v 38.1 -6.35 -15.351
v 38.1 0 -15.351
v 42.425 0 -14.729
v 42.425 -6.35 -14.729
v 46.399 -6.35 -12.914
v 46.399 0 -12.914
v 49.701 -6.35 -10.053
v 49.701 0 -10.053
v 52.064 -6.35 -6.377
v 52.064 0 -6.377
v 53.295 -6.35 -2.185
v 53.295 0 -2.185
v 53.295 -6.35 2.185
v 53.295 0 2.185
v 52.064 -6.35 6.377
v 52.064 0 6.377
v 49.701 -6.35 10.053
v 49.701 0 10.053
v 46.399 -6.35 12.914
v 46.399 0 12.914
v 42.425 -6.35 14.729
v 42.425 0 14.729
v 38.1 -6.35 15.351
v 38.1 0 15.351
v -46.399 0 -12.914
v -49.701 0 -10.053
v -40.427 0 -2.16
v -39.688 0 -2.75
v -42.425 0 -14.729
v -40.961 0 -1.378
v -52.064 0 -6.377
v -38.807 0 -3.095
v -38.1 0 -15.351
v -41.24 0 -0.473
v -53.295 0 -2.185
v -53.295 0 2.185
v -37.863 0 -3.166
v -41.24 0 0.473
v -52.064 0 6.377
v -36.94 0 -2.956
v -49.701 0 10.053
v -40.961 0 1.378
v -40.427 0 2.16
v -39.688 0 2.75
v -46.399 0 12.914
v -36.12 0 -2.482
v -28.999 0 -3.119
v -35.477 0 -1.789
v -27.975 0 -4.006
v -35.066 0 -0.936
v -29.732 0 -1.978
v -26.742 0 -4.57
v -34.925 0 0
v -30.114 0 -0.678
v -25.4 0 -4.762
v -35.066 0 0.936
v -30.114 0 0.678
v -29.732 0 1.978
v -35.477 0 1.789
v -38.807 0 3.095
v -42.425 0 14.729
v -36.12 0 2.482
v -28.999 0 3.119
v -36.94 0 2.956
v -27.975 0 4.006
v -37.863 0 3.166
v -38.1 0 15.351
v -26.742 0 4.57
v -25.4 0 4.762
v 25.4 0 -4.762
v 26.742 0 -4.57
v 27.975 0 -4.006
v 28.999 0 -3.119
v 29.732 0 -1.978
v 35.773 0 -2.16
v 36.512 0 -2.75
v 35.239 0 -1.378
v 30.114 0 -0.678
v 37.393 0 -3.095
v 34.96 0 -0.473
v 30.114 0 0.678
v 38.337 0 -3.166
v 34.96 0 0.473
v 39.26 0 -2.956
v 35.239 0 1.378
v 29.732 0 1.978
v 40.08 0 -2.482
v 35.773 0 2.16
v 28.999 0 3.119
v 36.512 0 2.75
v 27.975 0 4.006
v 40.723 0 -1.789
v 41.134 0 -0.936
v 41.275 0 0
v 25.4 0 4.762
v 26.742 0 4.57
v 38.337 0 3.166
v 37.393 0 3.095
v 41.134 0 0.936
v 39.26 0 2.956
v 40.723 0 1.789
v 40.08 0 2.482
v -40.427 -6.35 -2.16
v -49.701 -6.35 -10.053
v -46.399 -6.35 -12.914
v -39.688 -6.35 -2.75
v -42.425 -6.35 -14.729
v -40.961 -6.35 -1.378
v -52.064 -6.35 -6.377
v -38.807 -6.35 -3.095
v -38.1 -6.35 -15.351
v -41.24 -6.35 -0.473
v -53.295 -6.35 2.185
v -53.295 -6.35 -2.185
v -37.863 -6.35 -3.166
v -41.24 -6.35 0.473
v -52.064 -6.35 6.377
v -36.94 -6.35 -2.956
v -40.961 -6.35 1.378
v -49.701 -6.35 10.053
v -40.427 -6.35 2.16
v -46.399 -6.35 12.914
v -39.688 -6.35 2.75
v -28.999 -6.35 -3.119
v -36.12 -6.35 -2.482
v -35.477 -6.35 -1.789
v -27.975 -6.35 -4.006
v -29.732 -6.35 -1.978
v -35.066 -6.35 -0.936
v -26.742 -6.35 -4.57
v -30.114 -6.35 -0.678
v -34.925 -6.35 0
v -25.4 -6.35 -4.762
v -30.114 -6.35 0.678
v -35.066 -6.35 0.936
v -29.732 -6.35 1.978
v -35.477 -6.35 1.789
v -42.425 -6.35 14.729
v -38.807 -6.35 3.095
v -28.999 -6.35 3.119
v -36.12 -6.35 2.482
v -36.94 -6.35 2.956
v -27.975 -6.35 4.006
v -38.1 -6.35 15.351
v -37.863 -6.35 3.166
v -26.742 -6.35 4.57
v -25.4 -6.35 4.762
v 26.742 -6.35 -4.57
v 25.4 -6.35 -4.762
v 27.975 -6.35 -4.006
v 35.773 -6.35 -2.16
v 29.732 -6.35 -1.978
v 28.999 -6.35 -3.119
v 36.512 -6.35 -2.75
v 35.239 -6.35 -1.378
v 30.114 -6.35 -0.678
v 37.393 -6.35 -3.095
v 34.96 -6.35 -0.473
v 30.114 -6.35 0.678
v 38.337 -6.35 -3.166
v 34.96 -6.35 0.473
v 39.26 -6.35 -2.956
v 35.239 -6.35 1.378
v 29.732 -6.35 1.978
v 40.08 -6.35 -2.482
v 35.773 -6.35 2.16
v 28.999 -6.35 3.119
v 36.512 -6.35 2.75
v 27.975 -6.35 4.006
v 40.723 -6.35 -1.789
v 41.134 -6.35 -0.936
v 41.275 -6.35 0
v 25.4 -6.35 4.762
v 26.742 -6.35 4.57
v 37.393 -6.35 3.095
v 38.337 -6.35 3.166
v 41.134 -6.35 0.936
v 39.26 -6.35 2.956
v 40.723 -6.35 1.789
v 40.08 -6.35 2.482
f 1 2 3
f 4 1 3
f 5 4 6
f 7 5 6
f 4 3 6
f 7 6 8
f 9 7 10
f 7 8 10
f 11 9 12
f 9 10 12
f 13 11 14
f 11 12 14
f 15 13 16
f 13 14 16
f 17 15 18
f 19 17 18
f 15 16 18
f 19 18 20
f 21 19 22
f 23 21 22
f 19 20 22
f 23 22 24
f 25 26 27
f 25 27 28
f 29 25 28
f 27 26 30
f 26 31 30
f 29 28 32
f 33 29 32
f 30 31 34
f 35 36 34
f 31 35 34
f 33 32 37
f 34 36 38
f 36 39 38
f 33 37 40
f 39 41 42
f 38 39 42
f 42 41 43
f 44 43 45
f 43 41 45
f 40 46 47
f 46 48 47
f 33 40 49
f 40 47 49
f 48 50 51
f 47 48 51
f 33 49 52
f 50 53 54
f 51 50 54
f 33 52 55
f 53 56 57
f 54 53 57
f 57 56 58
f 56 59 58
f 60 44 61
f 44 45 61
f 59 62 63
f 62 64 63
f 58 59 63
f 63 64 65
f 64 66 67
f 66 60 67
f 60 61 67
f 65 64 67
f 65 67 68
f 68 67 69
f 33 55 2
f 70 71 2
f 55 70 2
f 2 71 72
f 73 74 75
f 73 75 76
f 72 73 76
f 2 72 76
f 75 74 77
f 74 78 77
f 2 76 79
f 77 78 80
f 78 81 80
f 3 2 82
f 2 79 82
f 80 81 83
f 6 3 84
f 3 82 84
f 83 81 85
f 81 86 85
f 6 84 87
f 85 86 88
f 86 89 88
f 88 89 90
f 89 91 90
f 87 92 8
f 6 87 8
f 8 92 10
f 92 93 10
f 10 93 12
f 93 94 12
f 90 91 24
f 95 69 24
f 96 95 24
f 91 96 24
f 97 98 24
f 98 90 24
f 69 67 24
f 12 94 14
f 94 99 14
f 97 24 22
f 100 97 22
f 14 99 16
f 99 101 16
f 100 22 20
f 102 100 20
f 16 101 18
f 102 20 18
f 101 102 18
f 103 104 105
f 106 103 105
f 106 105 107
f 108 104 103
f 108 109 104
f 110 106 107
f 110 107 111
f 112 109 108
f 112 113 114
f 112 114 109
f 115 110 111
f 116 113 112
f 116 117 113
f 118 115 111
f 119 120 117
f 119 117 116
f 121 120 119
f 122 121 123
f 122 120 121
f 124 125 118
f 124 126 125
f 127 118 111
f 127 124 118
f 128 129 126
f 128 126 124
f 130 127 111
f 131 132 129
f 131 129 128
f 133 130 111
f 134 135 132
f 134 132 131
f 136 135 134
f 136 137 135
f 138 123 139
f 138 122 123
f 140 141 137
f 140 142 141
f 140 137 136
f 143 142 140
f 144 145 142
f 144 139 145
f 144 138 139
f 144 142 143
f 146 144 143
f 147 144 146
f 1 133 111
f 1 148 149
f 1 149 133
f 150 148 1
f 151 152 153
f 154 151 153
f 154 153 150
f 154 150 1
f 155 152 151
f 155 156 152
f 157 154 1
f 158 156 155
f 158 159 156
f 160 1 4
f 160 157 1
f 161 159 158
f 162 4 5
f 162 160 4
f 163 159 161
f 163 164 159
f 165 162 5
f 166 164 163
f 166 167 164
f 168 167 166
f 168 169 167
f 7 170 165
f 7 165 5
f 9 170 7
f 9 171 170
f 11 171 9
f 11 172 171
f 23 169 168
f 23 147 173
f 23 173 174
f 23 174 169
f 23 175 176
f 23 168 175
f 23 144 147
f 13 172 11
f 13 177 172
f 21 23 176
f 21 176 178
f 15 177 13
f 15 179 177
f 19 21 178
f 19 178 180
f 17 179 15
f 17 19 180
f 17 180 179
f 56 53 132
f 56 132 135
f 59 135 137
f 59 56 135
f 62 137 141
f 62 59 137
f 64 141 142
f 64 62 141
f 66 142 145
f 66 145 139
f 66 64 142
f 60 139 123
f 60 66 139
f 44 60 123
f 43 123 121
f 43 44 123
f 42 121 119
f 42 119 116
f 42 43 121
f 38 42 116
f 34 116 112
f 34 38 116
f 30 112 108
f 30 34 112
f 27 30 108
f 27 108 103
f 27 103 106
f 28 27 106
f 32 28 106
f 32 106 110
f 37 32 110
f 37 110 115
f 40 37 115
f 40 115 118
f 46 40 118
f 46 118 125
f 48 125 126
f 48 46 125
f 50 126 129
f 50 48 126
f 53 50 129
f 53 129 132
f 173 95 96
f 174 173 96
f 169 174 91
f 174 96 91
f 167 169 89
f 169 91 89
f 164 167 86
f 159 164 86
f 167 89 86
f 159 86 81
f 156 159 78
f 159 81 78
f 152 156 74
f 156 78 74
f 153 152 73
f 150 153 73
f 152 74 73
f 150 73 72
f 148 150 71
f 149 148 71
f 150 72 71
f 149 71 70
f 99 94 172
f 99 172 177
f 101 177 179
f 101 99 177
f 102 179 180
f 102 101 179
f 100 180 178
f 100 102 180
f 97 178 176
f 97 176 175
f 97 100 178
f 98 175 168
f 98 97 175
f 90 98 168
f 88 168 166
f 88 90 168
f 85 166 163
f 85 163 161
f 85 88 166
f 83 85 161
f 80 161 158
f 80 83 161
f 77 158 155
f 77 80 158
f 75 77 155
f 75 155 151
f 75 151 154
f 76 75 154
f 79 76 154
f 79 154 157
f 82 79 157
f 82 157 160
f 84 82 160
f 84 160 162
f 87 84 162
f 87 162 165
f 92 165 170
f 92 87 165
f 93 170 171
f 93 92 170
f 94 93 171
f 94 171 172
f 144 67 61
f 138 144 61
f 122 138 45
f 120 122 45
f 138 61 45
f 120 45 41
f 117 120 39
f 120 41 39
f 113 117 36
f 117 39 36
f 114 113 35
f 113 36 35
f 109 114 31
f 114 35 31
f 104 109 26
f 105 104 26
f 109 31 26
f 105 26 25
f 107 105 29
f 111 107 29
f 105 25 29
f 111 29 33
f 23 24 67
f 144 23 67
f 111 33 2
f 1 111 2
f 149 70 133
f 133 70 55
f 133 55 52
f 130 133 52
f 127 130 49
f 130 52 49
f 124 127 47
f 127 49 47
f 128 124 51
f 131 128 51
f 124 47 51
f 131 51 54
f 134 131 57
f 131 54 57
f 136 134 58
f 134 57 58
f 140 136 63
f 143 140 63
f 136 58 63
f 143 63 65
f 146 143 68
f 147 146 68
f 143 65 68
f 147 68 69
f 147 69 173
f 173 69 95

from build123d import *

# Parameters (mm, degrees)
F0_R     = 3.175
F1_DEPTH = 6.35


with BuildPart() as f1:
    # F0 (on Front) → F1 (new body)
    with BuildSketch(Plane.XZ):
        with BuildLine():
            ThreePointArc((38.1, -15.350756), (53.450756, 0), (38.1, 15.350756))
            Line((38.1, 15.350756), (-38.1, 15.350756))
            ThreePointArc((-38.1, 15.350756), (-53.450756, 0), (-38.1, -15.350756))
            Line((-38.1, -15.350756), (38.1, -15.350756))
        make_face()
        with Locations((-38.1, 0)):
            Circle(F0_R, mode=Mode.SUBTRACT)
        with BuildLine():
            Line((-25.4, 4.7625), (25.4, 4.7625))
            ThreePointArc((25.4, 4.7625), (30.1625, 0), (25.4, -4.7625))
            Line((25.4, -4.7625), (-25.4, -4.7625))
            ThreePointArc((-25.4, -4.7625), (-30.1625, 0), (-25.4, 4.7625))
        make_face(mode=Mode.SUBTRACT)
        with Locations((38.1, 0)):
            Circle(F0_R, mode=Mode.SUBTRACT)
    extrude(amount=F1_DEPTH)


solid = f1.part
